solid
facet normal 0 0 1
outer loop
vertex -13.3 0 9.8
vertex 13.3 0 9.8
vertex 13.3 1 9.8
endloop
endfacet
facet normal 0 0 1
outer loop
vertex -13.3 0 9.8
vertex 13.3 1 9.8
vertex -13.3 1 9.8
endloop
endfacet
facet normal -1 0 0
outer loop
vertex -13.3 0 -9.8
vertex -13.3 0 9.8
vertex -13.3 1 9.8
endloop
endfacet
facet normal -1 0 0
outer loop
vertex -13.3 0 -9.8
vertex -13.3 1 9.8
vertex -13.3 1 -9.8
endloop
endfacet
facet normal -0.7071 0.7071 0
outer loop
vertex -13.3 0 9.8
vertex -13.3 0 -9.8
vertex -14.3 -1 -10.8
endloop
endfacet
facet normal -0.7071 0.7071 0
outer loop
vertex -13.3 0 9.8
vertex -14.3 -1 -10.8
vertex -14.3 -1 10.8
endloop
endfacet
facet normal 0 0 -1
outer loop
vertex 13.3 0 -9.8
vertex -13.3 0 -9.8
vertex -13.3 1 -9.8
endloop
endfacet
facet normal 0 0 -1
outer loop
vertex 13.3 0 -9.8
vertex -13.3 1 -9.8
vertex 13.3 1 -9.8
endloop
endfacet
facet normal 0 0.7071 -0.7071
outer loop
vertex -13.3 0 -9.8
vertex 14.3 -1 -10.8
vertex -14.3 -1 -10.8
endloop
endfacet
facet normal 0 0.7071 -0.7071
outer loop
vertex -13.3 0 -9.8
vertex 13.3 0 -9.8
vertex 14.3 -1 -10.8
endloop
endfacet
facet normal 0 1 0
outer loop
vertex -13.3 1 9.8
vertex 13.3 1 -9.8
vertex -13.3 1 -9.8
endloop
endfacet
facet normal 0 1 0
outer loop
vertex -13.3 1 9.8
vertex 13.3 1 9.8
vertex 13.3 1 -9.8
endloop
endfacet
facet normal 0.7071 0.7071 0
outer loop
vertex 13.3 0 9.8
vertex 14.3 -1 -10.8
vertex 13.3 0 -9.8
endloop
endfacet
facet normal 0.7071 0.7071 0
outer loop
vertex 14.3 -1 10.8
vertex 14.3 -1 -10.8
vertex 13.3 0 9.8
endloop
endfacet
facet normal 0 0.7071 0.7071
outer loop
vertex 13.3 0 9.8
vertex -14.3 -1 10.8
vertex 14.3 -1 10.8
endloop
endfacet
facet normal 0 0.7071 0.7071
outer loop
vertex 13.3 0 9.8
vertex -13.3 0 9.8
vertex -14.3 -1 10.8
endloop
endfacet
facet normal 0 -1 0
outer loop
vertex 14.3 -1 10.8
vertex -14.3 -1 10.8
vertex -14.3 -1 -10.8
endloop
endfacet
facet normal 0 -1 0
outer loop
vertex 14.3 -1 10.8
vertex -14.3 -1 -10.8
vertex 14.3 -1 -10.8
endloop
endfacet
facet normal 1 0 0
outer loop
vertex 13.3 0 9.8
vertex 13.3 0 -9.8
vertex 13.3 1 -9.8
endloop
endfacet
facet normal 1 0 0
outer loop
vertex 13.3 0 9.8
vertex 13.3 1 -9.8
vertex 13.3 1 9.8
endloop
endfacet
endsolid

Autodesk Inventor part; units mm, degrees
ref_plane "YZ Plane" through (0, 0, 0) normal (1, 0, 0) x (0, 1, 0)
ref_plane "XZ Plane" through (0, 0, 0) normal (0, 1, 0) x (-1, 0, 0)
ref_plane "XY Plane" through (0, 0, 0) normal (0, 0, 1) x (1, 0, 0)
sketch "Sketch1" plane through (0, 0, 0) normal (0, 1, 0) x (-1, 0, 0)
  line L0 (-13.3, 9.8) -> (13.3, 9.8)
  line L1 (13.3, 9.8) -> (13.3, -9.8)
  line L2 (13.3, -9.8) -> (-13.3, -9.8)
  line L3 (-13.3, -9.8) -> (-13.3, 9.8)
  line L4 (-13.3, 9.8) -> (13.3, -9.8) construction
  line L5 (13.3, 9.8) -> (-13.3, -9.8) construction
  point P0 (0, 0)
  dimension "d0" = 26.6
  dimension "d1" = 19.6
extrude "Extrusion1" add sketch "Sketch1" along normal blind 1
sketch "Sketch2" plane through (0, 0, 0) normal (0, -1, 0) x (1, 0, 0)
  line L0 (13.3, 9.8) -> (-13.3, 9.8) projected
  line L1 (13.3, -9.8) -> (13.3, 9.8) projected
  line L2 (-14.3, -10.8) -> (14.3, -10.8)
  line L3 (14.3, -10.8) -> (14.3, 10.8)
  line L4 (14.3, 10.8) -> (-14.3, 10.8)
  line L5 (-14.3, 10.8) -> (-14.3, -10.8)
  line L6 (-14.3, -10.8) -> (14.3, 10.8) construction
  line L7 (14.3, -10.8) -> (-14.3, 10.8) construction
  point P0 (0, 0)
  dimension "d4" = 1
  dimension "d5" = 1
extrude "Extrusion2" add sketch "Sketch2" along normal blind 1
chamfer "Chamfer1" distance 1 angle 45 4 edges at (0, 0, 10.8) (-14.3, 0, 0) (14.3, 0, 0) (0, 0, -10.8)
properties part number "wysw trans"
